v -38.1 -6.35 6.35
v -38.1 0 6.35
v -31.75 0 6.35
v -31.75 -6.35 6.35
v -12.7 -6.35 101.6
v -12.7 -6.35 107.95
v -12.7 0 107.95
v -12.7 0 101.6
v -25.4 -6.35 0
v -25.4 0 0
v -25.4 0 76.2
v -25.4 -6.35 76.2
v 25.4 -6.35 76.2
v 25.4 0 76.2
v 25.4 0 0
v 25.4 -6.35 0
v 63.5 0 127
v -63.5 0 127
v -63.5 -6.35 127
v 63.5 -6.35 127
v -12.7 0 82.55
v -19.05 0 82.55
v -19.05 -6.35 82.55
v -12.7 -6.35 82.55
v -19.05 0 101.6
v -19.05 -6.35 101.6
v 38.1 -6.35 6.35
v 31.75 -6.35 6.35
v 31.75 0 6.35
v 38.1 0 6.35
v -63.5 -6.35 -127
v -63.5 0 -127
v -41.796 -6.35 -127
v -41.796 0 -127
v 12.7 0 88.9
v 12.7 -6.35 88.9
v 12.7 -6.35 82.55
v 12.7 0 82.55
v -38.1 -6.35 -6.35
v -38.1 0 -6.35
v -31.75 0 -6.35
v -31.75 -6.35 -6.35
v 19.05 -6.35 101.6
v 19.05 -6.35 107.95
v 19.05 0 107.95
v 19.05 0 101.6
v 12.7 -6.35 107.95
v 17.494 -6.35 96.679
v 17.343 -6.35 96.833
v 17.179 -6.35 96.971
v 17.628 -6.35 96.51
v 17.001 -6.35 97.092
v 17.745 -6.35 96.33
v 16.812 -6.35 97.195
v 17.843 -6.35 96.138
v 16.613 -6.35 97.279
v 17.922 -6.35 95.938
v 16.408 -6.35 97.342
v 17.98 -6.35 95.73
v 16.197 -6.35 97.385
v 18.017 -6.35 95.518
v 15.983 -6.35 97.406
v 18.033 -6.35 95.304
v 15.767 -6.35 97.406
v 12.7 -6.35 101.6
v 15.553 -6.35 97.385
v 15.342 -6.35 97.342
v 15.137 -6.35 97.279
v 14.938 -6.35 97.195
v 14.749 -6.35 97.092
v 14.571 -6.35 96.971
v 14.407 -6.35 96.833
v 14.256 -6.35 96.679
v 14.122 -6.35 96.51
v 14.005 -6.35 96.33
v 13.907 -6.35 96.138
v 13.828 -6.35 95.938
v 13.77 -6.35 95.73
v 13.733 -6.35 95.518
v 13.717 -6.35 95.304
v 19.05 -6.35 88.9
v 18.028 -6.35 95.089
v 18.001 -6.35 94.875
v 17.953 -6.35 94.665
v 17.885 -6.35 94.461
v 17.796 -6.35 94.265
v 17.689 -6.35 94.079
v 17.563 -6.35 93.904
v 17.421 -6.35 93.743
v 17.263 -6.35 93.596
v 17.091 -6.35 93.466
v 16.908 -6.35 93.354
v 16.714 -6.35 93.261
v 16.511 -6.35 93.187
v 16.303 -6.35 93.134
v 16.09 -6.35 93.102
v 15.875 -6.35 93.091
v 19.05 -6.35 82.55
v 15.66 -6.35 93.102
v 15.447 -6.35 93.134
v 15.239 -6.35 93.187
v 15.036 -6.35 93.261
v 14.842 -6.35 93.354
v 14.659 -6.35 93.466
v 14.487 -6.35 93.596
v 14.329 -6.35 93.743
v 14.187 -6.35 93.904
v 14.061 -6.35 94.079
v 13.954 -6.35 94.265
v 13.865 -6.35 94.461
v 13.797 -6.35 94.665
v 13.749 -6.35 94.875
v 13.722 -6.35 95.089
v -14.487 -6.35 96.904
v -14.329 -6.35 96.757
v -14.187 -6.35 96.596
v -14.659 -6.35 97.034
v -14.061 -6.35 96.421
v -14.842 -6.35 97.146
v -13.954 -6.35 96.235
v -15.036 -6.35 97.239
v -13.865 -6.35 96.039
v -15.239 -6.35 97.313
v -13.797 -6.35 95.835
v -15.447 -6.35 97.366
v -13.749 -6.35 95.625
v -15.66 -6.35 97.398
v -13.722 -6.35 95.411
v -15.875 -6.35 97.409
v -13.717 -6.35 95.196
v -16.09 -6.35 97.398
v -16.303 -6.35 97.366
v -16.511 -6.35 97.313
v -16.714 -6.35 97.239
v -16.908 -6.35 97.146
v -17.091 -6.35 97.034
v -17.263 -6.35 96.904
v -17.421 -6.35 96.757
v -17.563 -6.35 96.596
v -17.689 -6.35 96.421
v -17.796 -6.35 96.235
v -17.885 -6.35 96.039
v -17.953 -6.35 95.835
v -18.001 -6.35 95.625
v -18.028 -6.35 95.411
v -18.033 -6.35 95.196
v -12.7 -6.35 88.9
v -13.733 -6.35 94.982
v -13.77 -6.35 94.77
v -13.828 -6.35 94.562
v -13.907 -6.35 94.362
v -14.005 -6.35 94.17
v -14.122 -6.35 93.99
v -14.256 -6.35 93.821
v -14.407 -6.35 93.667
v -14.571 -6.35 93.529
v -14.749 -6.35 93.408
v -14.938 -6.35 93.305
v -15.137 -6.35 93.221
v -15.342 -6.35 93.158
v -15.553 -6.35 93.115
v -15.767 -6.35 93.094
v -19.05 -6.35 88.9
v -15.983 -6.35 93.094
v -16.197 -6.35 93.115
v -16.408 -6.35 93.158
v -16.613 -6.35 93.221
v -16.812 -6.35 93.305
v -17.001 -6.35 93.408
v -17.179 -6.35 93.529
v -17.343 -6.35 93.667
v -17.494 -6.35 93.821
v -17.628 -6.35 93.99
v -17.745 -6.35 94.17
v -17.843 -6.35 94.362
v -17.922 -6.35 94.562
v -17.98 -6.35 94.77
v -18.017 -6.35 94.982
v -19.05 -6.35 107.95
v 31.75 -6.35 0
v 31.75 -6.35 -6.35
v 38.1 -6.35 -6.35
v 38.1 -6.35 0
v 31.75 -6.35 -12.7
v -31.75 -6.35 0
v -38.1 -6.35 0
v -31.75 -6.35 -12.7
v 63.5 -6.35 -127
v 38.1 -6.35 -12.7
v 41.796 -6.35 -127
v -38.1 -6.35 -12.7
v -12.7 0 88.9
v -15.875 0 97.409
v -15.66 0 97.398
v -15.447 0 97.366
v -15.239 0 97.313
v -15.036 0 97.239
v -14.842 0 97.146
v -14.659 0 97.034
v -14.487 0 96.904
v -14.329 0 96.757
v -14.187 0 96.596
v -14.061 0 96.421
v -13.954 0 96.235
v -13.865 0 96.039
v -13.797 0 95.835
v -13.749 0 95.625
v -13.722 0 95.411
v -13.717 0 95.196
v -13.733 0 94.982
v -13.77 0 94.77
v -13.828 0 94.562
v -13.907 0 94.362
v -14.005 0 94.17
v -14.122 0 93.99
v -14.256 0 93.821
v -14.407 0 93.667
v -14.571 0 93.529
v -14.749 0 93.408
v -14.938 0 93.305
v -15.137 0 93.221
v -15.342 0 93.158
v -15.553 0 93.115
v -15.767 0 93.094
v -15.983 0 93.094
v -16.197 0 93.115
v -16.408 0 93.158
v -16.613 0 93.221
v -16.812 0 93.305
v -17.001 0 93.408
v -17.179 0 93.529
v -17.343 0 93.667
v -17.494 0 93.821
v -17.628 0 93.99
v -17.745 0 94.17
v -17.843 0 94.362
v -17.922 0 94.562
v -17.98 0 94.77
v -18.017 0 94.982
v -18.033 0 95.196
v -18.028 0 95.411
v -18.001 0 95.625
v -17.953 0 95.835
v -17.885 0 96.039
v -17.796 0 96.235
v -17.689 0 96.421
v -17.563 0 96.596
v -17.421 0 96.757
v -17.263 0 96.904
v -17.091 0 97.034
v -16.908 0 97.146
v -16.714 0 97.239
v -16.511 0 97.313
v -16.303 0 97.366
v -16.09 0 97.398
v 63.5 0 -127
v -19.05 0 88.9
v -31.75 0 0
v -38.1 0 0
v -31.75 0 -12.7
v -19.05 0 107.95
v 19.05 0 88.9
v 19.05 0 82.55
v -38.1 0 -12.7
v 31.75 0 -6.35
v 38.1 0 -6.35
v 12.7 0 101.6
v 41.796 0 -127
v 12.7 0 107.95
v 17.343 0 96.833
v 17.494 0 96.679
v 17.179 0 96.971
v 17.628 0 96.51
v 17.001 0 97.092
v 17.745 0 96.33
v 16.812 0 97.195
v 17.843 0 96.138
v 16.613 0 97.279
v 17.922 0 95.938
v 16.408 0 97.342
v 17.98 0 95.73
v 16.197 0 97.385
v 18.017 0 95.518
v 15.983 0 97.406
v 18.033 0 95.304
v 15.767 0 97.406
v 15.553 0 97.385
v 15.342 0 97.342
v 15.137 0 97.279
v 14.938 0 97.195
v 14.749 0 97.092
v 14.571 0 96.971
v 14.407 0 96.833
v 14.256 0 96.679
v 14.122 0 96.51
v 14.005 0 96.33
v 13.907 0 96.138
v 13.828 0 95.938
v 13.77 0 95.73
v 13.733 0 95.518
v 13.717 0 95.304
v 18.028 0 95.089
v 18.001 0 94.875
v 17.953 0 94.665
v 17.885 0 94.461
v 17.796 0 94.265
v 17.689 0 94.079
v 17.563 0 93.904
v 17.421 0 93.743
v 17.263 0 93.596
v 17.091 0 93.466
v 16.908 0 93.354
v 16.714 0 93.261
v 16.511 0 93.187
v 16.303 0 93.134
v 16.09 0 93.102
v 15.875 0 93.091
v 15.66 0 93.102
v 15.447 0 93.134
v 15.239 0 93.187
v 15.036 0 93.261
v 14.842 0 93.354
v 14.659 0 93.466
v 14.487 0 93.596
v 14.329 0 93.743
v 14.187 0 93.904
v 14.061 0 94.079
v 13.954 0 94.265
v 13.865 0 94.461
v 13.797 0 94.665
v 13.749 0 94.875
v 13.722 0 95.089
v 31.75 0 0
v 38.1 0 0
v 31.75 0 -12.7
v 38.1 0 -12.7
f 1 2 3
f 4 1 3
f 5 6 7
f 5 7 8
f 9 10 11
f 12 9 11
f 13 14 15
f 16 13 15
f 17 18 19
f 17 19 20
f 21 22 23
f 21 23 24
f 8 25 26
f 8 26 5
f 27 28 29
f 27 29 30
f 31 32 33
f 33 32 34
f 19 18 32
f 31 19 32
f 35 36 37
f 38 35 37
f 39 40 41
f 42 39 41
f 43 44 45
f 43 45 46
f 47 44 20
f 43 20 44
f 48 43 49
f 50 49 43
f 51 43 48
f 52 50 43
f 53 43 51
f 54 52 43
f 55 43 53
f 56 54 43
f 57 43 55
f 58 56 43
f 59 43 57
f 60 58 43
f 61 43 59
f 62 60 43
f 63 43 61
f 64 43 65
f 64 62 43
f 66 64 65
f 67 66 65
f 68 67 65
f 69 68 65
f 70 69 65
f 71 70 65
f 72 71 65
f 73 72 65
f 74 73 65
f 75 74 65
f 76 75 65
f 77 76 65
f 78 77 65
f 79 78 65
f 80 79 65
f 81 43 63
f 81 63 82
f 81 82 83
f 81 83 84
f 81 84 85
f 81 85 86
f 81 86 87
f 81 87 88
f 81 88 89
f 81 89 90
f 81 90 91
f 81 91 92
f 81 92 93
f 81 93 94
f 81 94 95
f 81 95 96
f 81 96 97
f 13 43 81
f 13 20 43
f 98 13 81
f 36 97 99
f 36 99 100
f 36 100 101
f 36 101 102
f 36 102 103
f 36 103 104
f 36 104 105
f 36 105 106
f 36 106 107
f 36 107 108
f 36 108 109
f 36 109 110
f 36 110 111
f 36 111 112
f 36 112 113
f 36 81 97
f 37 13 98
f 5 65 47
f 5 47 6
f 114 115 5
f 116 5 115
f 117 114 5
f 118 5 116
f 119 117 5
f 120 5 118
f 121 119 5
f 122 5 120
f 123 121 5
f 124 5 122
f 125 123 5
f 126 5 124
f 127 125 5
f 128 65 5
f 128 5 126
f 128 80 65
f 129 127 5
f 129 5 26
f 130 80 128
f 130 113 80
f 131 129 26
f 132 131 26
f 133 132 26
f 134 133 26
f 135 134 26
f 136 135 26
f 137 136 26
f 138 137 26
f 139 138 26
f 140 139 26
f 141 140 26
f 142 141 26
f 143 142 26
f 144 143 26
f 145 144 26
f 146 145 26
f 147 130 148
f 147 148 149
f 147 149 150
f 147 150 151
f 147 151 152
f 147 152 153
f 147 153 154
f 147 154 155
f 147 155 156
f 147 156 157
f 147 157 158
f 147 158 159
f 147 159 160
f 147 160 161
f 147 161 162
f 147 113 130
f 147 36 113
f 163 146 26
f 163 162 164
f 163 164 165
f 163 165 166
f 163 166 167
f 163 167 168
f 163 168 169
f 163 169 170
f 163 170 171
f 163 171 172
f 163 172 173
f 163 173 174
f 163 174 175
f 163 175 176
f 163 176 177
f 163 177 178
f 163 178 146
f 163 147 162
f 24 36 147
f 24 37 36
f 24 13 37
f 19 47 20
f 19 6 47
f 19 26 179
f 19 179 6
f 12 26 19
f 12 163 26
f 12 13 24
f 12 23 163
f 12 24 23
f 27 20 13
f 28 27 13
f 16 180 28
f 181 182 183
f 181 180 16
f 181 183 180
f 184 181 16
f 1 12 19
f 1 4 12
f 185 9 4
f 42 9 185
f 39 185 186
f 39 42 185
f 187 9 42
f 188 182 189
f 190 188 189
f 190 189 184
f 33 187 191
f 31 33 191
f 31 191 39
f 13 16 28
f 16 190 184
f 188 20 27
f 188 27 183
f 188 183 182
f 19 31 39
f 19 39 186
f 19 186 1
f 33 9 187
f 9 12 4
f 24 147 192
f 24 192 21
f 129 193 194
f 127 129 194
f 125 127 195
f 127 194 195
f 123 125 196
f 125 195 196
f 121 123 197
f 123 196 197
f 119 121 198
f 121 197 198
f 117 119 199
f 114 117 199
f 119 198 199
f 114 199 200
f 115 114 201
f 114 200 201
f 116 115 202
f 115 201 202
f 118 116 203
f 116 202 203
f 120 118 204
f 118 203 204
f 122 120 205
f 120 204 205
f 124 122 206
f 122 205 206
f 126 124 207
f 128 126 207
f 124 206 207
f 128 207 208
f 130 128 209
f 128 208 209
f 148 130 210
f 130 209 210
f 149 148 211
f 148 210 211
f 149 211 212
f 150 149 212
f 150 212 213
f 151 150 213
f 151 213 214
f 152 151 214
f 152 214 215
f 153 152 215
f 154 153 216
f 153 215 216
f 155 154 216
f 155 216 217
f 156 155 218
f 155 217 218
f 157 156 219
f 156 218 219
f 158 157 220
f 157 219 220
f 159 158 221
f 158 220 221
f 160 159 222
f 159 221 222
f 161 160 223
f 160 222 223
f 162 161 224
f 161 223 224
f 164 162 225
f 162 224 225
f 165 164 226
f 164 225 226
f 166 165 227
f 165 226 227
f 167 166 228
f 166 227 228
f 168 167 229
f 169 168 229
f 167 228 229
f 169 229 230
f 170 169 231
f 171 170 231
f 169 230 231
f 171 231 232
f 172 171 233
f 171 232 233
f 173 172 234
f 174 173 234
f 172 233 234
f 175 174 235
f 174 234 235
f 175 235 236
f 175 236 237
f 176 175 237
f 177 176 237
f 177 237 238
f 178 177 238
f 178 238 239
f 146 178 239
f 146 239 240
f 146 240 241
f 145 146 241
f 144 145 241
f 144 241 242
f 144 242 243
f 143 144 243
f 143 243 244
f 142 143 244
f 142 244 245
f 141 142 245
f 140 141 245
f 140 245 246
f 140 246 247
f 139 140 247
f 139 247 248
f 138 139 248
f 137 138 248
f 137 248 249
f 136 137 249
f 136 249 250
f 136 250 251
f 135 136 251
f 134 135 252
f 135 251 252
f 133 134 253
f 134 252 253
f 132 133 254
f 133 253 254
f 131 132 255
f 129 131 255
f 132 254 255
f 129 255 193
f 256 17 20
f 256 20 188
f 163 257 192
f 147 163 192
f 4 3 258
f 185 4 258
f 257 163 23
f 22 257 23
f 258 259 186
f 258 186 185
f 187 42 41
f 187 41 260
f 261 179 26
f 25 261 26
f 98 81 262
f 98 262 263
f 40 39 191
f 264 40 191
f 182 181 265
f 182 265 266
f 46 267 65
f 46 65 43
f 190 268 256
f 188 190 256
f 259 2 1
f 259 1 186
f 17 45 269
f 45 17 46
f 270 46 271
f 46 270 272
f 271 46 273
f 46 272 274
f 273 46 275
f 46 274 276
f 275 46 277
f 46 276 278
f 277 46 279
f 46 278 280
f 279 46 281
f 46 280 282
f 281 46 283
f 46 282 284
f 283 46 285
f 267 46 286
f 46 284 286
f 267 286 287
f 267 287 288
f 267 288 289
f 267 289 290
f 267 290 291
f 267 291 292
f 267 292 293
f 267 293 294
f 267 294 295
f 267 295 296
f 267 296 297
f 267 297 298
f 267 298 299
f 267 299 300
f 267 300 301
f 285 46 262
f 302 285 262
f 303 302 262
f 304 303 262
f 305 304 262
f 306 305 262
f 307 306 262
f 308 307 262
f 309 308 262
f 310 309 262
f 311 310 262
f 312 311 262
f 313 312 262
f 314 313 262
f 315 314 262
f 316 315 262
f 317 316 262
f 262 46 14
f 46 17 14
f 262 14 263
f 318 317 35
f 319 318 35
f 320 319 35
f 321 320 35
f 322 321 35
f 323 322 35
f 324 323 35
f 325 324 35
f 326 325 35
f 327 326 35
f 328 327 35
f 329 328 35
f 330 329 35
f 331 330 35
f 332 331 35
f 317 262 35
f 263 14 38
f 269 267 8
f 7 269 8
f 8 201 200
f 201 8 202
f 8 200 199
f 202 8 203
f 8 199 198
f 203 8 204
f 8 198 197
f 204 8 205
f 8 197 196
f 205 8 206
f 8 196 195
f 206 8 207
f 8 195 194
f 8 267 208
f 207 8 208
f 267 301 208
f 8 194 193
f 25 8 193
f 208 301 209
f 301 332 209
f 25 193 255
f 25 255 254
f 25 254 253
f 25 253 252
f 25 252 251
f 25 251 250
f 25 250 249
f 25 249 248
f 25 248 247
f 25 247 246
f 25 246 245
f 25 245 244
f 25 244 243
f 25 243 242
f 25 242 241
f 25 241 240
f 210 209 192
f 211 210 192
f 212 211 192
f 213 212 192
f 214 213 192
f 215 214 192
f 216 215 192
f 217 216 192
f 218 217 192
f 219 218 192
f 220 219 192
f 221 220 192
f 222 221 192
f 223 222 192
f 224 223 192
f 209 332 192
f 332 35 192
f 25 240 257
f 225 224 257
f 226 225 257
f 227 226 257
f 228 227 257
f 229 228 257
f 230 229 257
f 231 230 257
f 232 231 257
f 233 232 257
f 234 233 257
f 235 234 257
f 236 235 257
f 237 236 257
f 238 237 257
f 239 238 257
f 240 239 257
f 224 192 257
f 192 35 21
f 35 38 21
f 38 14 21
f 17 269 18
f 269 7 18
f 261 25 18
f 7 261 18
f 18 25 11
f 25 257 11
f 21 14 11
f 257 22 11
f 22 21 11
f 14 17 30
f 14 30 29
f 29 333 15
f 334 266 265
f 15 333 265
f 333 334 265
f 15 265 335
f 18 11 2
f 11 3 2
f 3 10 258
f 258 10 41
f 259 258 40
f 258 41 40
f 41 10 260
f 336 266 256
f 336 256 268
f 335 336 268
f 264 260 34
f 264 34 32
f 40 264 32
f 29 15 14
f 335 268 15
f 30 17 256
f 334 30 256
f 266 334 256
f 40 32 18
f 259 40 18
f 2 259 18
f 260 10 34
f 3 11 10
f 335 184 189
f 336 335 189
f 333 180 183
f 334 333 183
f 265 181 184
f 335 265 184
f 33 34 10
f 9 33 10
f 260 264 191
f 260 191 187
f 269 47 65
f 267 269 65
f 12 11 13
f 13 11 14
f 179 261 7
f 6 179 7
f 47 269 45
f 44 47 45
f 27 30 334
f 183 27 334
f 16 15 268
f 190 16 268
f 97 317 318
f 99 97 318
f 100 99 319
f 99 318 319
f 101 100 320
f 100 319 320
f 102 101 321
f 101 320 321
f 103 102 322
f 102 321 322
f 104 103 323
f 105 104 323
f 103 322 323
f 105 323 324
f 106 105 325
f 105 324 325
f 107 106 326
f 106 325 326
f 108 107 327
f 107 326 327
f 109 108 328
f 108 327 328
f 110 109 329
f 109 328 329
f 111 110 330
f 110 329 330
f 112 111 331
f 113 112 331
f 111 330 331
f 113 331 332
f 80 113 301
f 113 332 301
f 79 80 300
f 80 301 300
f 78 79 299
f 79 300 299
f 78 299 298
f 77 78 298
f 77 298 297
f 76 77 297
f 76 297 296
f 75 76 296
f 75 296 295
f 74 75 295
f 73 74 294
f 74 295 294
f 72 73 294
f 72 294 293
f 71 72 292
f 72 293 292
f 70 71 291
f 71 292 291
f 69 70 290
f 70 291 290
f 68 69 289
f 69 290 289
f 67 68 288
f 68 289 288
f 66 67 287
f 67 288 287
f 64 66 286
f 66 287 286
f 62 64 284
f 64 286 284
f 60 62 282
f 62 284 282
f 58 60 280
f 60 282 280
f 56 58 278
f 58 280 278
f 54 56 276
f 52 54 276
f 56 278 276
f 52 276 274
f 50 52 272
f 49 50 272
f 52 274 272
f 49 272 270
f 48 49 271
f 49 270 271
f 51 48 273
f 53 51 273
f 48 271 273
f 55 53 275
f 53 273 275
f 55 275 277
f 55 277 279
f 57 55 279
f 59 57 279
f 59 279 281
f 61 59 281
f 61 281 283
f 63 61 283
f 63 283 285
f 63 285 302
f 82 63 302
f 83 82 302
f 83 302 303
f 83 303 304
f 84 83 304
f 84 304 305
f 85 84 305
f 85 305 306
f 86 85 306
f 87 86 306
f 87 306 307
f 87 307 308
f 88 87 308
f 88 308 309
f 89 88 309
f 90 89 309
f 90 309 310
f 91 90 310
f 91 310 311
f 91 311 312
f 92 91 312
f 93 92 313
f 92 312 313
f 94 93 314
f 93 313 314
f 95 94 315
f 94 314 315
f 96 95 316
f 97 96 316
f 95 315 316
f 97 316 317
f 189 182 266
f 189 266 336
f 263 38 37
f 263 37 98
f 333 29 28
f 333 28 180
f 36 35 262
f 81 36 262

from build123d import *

# Parameters (mm, degrees)
BOTTOM_PLATE_R      = 2.159
BOTTOM_PLATE_R_2    = 2.794
BOTTOM_PLATE_W      = 25.4
BOTTOM_PLATE_H      = 101.6
BOTTOM_PLATE_W_2    = 6.35
BOTTOM_PLATE_H_2    = 6.35
BOSS_EXTRUDE1_DEPTH = 6.35
SKETCH1_W           = 508
SKETCH1_H           = 508
SKETCH1_W_2         = 127
SKETCH1_H_2         = 254
CUT_EXTRUDE2_DEPTH  = 25.4


with BuildPart() as part:
    # Bottom Plate → Boss-Extrude1 (new body)
    # profile 1 of 3: a face of its own
    with BuildSketch(Plane(origin=(0, 0, 0), x_dir=(1, 0, 0), z_dir=(0, 1, 0))):
        with BuildLine():
            Line((25.4, 0), (50.8, 196.747553987))
            ThreePointArc((50.8, 196.747553987), (0, -203.2), (-50.8, 196.747553987))
            Line((-50.8, 196.747553987), (-25.4, 0))
            Line((-25.4, 0), (-25.4, -76.2))
            Line((-25.4, -76.2), (25.4, -76.2))
            Line((25.4, -76.2), (25.4, 0))
        make_face()
        with Locations((155.026770144, 72.009)):
            Circle(BOTTOM_PLATE_R, mode=Mode.SUBTRACT)
        with Locations((155.026770144, -72.009)):
            Circle(BOTTOM_PLATE_R, mode=Mode.SUBTRACT)
        with Locations((57.243949466, 172.269543754)):
            Circle(BOTTOM_PLATE_R, mode=Mode.SUBTRACT)
        with Locations(Location((-15.875, -95.25, 0), (0, 0, 270))):
            Circle(BOTTOM_PLATE_R, mode=Mode.SUBTRACT)
        with Locations((27.813, -152.4)):
            Circle(BOTTOM_PLATE_R_2, mode=Mode.SUBTRACT)
        with Locations((-27.813, -152.4)):
            Circle(BOTTOM_PLATE_R_2, mode=Mode.SUBTRACT)
        with Locations(Location((15.875, -95.25, 0), (0, 0, 90))):
            Circle(BOTTOM_PLATE_R, mode=Mode.SUBTRACT)
        with Locations((-155.026770144, -72.009)):
            Circle(BOTTOM_PLATE_R, mode=Mode.SUBTRACT)
        with Locations((-155.026770144, 72.009)):
            Circle(BOTTOM_PLATE_R, mode=Mode.SUBTRACT)
        with Locations((-57.243949466, 172.269543754)):
            Circle(BOTTOM_PLATE_R, mode=Mode.SUBTRACT)
        with Locations((170.901770144, 0)):
            Rectangle(BOTTOM_PLATE_W, BOTTOM_PLATE_H, mode=Mode.SUBTRACT)
        with Locations((-34.925, 9.525)):
            Rectangle(BOTTOM_PLATE_W_2, BOTTOM_PLATE_H_2, mode=Mode.SUBTRACT)
        with Locations((34.925, -3.175)):
            Rectangle(BOTTOM_PLATE_W_2, BOTTOM_PLATE_H_2, mode=Mode.SUBTRACT)
        with Locations((34.925, 9.525)):
            Rectangle(BOTTOM_PLATE_W_2, BOTTOM_PLATE_H_2, mode=Mode.SUBTRACT)
        with Locations((155.026770144, -60.325)):
            Rectangle(BOTTOM_PLATE_W_2, BOTTOM_PLATE_H_2, mode=Mode.SUBTRACT)
        with Locations((155.026770144, 60.325)):
            Rectangle(BOTTOM_PLATE_W_2, BOTTOM_PLATE_H_2, mode=Mode.SUBTRACT)
        with Locations((-34.925, -3.175)):
            Rectangle(BOTTOM_PLATE_W_2, BOTTOM_PLATE_H_2, mode=Mode.SUBTRACT)
        with Locations((-15.875, -85.725)):
            Rectangle(BOTTOM_PLATE_W_2, BOTTOM_PLATE_H_2, mode=Mode.SUBTRACT)
        with Locations((-15.875, -104.775)):
            Rectangle(BOTTOM_PLATE_W_2, BOTTOM_PLATE_H_2, mode=Mode.SUBTRACT)
        with Locations((15.875, -104.775)):
            Rectangle(BOTTOM_PLATE_W_2, BOTTOM_PLATE_H_2, mode=Mode.SUBTRACT)
        with Locations((15.875, -85.725)):
            Rectangle(BOTTOM_PLATE_W_2, BOTTOM_PLATE_H_2, mode=Mode.SUBTRACT)
        with Locations((-170.901770144, 0)):
            Rectangle(BOTTOM_PLATE_W, BOTTOM_PLATE_H, mode=Mode.SUBTRACT)
        with Locations((-155.026770144, -60.325)):
            Rectangle(BOTTOM_PLATE_W_2, BOTTOM_PLATE_H_2, mode=Mode.SUBTRACT)
        with Locations((-155.026770144, 60.325)):
            Rectangle(BOTTOM_PLATE_W_2, BOTTOM_PLATE_H_2, mode=Mode.SUBTRACT)
    # profile 2 of 3: a face of its own
    with BuildSketch(Plane(origin=(0, 0, 0), x_dir=(1, 0, 0), z_dir=(0, 1, 0))):
        Polygon((55.672367921, 184.893668177), (61.970103658, 184.08063399), (62.783137846, 190.378369726), (56.485402109, 191.191403914), align=None)
    # profile 3 of 3: a face of its own
    with BuildSketch(Plane(origin=(0, 0, 0), x_dir=(1, 0, 0), z_dir=(0, 1, 0))):
        Polygon((-61.970103658, 184.08063399), (-62.783137846, 190.378369726), (-56.485402109, 191.191403914), (-55.672367921, 184.893668177), align=None)
    extrude(amount=-BOSS_EXTRUDE1_DEPTH)

    # Sketch1 → Cut-Extrude2 (cut)
    with BuildSketch(Plane(origin=(0, 0, 0), x_dir=(1, 0, 0), z_dir=(0, 1, 0))):
        Rectangle(SKETCH1_W, SKETCH1_H)
        Rectangle(SKETCH1_W_2, SKETCH1_H_2, mode=Mode.SUBTRACT)
    extrude(amount=-CUT_EXTRUDE2_DEPTH, mode=Mode.SUBTRACT)


solid = part.part
